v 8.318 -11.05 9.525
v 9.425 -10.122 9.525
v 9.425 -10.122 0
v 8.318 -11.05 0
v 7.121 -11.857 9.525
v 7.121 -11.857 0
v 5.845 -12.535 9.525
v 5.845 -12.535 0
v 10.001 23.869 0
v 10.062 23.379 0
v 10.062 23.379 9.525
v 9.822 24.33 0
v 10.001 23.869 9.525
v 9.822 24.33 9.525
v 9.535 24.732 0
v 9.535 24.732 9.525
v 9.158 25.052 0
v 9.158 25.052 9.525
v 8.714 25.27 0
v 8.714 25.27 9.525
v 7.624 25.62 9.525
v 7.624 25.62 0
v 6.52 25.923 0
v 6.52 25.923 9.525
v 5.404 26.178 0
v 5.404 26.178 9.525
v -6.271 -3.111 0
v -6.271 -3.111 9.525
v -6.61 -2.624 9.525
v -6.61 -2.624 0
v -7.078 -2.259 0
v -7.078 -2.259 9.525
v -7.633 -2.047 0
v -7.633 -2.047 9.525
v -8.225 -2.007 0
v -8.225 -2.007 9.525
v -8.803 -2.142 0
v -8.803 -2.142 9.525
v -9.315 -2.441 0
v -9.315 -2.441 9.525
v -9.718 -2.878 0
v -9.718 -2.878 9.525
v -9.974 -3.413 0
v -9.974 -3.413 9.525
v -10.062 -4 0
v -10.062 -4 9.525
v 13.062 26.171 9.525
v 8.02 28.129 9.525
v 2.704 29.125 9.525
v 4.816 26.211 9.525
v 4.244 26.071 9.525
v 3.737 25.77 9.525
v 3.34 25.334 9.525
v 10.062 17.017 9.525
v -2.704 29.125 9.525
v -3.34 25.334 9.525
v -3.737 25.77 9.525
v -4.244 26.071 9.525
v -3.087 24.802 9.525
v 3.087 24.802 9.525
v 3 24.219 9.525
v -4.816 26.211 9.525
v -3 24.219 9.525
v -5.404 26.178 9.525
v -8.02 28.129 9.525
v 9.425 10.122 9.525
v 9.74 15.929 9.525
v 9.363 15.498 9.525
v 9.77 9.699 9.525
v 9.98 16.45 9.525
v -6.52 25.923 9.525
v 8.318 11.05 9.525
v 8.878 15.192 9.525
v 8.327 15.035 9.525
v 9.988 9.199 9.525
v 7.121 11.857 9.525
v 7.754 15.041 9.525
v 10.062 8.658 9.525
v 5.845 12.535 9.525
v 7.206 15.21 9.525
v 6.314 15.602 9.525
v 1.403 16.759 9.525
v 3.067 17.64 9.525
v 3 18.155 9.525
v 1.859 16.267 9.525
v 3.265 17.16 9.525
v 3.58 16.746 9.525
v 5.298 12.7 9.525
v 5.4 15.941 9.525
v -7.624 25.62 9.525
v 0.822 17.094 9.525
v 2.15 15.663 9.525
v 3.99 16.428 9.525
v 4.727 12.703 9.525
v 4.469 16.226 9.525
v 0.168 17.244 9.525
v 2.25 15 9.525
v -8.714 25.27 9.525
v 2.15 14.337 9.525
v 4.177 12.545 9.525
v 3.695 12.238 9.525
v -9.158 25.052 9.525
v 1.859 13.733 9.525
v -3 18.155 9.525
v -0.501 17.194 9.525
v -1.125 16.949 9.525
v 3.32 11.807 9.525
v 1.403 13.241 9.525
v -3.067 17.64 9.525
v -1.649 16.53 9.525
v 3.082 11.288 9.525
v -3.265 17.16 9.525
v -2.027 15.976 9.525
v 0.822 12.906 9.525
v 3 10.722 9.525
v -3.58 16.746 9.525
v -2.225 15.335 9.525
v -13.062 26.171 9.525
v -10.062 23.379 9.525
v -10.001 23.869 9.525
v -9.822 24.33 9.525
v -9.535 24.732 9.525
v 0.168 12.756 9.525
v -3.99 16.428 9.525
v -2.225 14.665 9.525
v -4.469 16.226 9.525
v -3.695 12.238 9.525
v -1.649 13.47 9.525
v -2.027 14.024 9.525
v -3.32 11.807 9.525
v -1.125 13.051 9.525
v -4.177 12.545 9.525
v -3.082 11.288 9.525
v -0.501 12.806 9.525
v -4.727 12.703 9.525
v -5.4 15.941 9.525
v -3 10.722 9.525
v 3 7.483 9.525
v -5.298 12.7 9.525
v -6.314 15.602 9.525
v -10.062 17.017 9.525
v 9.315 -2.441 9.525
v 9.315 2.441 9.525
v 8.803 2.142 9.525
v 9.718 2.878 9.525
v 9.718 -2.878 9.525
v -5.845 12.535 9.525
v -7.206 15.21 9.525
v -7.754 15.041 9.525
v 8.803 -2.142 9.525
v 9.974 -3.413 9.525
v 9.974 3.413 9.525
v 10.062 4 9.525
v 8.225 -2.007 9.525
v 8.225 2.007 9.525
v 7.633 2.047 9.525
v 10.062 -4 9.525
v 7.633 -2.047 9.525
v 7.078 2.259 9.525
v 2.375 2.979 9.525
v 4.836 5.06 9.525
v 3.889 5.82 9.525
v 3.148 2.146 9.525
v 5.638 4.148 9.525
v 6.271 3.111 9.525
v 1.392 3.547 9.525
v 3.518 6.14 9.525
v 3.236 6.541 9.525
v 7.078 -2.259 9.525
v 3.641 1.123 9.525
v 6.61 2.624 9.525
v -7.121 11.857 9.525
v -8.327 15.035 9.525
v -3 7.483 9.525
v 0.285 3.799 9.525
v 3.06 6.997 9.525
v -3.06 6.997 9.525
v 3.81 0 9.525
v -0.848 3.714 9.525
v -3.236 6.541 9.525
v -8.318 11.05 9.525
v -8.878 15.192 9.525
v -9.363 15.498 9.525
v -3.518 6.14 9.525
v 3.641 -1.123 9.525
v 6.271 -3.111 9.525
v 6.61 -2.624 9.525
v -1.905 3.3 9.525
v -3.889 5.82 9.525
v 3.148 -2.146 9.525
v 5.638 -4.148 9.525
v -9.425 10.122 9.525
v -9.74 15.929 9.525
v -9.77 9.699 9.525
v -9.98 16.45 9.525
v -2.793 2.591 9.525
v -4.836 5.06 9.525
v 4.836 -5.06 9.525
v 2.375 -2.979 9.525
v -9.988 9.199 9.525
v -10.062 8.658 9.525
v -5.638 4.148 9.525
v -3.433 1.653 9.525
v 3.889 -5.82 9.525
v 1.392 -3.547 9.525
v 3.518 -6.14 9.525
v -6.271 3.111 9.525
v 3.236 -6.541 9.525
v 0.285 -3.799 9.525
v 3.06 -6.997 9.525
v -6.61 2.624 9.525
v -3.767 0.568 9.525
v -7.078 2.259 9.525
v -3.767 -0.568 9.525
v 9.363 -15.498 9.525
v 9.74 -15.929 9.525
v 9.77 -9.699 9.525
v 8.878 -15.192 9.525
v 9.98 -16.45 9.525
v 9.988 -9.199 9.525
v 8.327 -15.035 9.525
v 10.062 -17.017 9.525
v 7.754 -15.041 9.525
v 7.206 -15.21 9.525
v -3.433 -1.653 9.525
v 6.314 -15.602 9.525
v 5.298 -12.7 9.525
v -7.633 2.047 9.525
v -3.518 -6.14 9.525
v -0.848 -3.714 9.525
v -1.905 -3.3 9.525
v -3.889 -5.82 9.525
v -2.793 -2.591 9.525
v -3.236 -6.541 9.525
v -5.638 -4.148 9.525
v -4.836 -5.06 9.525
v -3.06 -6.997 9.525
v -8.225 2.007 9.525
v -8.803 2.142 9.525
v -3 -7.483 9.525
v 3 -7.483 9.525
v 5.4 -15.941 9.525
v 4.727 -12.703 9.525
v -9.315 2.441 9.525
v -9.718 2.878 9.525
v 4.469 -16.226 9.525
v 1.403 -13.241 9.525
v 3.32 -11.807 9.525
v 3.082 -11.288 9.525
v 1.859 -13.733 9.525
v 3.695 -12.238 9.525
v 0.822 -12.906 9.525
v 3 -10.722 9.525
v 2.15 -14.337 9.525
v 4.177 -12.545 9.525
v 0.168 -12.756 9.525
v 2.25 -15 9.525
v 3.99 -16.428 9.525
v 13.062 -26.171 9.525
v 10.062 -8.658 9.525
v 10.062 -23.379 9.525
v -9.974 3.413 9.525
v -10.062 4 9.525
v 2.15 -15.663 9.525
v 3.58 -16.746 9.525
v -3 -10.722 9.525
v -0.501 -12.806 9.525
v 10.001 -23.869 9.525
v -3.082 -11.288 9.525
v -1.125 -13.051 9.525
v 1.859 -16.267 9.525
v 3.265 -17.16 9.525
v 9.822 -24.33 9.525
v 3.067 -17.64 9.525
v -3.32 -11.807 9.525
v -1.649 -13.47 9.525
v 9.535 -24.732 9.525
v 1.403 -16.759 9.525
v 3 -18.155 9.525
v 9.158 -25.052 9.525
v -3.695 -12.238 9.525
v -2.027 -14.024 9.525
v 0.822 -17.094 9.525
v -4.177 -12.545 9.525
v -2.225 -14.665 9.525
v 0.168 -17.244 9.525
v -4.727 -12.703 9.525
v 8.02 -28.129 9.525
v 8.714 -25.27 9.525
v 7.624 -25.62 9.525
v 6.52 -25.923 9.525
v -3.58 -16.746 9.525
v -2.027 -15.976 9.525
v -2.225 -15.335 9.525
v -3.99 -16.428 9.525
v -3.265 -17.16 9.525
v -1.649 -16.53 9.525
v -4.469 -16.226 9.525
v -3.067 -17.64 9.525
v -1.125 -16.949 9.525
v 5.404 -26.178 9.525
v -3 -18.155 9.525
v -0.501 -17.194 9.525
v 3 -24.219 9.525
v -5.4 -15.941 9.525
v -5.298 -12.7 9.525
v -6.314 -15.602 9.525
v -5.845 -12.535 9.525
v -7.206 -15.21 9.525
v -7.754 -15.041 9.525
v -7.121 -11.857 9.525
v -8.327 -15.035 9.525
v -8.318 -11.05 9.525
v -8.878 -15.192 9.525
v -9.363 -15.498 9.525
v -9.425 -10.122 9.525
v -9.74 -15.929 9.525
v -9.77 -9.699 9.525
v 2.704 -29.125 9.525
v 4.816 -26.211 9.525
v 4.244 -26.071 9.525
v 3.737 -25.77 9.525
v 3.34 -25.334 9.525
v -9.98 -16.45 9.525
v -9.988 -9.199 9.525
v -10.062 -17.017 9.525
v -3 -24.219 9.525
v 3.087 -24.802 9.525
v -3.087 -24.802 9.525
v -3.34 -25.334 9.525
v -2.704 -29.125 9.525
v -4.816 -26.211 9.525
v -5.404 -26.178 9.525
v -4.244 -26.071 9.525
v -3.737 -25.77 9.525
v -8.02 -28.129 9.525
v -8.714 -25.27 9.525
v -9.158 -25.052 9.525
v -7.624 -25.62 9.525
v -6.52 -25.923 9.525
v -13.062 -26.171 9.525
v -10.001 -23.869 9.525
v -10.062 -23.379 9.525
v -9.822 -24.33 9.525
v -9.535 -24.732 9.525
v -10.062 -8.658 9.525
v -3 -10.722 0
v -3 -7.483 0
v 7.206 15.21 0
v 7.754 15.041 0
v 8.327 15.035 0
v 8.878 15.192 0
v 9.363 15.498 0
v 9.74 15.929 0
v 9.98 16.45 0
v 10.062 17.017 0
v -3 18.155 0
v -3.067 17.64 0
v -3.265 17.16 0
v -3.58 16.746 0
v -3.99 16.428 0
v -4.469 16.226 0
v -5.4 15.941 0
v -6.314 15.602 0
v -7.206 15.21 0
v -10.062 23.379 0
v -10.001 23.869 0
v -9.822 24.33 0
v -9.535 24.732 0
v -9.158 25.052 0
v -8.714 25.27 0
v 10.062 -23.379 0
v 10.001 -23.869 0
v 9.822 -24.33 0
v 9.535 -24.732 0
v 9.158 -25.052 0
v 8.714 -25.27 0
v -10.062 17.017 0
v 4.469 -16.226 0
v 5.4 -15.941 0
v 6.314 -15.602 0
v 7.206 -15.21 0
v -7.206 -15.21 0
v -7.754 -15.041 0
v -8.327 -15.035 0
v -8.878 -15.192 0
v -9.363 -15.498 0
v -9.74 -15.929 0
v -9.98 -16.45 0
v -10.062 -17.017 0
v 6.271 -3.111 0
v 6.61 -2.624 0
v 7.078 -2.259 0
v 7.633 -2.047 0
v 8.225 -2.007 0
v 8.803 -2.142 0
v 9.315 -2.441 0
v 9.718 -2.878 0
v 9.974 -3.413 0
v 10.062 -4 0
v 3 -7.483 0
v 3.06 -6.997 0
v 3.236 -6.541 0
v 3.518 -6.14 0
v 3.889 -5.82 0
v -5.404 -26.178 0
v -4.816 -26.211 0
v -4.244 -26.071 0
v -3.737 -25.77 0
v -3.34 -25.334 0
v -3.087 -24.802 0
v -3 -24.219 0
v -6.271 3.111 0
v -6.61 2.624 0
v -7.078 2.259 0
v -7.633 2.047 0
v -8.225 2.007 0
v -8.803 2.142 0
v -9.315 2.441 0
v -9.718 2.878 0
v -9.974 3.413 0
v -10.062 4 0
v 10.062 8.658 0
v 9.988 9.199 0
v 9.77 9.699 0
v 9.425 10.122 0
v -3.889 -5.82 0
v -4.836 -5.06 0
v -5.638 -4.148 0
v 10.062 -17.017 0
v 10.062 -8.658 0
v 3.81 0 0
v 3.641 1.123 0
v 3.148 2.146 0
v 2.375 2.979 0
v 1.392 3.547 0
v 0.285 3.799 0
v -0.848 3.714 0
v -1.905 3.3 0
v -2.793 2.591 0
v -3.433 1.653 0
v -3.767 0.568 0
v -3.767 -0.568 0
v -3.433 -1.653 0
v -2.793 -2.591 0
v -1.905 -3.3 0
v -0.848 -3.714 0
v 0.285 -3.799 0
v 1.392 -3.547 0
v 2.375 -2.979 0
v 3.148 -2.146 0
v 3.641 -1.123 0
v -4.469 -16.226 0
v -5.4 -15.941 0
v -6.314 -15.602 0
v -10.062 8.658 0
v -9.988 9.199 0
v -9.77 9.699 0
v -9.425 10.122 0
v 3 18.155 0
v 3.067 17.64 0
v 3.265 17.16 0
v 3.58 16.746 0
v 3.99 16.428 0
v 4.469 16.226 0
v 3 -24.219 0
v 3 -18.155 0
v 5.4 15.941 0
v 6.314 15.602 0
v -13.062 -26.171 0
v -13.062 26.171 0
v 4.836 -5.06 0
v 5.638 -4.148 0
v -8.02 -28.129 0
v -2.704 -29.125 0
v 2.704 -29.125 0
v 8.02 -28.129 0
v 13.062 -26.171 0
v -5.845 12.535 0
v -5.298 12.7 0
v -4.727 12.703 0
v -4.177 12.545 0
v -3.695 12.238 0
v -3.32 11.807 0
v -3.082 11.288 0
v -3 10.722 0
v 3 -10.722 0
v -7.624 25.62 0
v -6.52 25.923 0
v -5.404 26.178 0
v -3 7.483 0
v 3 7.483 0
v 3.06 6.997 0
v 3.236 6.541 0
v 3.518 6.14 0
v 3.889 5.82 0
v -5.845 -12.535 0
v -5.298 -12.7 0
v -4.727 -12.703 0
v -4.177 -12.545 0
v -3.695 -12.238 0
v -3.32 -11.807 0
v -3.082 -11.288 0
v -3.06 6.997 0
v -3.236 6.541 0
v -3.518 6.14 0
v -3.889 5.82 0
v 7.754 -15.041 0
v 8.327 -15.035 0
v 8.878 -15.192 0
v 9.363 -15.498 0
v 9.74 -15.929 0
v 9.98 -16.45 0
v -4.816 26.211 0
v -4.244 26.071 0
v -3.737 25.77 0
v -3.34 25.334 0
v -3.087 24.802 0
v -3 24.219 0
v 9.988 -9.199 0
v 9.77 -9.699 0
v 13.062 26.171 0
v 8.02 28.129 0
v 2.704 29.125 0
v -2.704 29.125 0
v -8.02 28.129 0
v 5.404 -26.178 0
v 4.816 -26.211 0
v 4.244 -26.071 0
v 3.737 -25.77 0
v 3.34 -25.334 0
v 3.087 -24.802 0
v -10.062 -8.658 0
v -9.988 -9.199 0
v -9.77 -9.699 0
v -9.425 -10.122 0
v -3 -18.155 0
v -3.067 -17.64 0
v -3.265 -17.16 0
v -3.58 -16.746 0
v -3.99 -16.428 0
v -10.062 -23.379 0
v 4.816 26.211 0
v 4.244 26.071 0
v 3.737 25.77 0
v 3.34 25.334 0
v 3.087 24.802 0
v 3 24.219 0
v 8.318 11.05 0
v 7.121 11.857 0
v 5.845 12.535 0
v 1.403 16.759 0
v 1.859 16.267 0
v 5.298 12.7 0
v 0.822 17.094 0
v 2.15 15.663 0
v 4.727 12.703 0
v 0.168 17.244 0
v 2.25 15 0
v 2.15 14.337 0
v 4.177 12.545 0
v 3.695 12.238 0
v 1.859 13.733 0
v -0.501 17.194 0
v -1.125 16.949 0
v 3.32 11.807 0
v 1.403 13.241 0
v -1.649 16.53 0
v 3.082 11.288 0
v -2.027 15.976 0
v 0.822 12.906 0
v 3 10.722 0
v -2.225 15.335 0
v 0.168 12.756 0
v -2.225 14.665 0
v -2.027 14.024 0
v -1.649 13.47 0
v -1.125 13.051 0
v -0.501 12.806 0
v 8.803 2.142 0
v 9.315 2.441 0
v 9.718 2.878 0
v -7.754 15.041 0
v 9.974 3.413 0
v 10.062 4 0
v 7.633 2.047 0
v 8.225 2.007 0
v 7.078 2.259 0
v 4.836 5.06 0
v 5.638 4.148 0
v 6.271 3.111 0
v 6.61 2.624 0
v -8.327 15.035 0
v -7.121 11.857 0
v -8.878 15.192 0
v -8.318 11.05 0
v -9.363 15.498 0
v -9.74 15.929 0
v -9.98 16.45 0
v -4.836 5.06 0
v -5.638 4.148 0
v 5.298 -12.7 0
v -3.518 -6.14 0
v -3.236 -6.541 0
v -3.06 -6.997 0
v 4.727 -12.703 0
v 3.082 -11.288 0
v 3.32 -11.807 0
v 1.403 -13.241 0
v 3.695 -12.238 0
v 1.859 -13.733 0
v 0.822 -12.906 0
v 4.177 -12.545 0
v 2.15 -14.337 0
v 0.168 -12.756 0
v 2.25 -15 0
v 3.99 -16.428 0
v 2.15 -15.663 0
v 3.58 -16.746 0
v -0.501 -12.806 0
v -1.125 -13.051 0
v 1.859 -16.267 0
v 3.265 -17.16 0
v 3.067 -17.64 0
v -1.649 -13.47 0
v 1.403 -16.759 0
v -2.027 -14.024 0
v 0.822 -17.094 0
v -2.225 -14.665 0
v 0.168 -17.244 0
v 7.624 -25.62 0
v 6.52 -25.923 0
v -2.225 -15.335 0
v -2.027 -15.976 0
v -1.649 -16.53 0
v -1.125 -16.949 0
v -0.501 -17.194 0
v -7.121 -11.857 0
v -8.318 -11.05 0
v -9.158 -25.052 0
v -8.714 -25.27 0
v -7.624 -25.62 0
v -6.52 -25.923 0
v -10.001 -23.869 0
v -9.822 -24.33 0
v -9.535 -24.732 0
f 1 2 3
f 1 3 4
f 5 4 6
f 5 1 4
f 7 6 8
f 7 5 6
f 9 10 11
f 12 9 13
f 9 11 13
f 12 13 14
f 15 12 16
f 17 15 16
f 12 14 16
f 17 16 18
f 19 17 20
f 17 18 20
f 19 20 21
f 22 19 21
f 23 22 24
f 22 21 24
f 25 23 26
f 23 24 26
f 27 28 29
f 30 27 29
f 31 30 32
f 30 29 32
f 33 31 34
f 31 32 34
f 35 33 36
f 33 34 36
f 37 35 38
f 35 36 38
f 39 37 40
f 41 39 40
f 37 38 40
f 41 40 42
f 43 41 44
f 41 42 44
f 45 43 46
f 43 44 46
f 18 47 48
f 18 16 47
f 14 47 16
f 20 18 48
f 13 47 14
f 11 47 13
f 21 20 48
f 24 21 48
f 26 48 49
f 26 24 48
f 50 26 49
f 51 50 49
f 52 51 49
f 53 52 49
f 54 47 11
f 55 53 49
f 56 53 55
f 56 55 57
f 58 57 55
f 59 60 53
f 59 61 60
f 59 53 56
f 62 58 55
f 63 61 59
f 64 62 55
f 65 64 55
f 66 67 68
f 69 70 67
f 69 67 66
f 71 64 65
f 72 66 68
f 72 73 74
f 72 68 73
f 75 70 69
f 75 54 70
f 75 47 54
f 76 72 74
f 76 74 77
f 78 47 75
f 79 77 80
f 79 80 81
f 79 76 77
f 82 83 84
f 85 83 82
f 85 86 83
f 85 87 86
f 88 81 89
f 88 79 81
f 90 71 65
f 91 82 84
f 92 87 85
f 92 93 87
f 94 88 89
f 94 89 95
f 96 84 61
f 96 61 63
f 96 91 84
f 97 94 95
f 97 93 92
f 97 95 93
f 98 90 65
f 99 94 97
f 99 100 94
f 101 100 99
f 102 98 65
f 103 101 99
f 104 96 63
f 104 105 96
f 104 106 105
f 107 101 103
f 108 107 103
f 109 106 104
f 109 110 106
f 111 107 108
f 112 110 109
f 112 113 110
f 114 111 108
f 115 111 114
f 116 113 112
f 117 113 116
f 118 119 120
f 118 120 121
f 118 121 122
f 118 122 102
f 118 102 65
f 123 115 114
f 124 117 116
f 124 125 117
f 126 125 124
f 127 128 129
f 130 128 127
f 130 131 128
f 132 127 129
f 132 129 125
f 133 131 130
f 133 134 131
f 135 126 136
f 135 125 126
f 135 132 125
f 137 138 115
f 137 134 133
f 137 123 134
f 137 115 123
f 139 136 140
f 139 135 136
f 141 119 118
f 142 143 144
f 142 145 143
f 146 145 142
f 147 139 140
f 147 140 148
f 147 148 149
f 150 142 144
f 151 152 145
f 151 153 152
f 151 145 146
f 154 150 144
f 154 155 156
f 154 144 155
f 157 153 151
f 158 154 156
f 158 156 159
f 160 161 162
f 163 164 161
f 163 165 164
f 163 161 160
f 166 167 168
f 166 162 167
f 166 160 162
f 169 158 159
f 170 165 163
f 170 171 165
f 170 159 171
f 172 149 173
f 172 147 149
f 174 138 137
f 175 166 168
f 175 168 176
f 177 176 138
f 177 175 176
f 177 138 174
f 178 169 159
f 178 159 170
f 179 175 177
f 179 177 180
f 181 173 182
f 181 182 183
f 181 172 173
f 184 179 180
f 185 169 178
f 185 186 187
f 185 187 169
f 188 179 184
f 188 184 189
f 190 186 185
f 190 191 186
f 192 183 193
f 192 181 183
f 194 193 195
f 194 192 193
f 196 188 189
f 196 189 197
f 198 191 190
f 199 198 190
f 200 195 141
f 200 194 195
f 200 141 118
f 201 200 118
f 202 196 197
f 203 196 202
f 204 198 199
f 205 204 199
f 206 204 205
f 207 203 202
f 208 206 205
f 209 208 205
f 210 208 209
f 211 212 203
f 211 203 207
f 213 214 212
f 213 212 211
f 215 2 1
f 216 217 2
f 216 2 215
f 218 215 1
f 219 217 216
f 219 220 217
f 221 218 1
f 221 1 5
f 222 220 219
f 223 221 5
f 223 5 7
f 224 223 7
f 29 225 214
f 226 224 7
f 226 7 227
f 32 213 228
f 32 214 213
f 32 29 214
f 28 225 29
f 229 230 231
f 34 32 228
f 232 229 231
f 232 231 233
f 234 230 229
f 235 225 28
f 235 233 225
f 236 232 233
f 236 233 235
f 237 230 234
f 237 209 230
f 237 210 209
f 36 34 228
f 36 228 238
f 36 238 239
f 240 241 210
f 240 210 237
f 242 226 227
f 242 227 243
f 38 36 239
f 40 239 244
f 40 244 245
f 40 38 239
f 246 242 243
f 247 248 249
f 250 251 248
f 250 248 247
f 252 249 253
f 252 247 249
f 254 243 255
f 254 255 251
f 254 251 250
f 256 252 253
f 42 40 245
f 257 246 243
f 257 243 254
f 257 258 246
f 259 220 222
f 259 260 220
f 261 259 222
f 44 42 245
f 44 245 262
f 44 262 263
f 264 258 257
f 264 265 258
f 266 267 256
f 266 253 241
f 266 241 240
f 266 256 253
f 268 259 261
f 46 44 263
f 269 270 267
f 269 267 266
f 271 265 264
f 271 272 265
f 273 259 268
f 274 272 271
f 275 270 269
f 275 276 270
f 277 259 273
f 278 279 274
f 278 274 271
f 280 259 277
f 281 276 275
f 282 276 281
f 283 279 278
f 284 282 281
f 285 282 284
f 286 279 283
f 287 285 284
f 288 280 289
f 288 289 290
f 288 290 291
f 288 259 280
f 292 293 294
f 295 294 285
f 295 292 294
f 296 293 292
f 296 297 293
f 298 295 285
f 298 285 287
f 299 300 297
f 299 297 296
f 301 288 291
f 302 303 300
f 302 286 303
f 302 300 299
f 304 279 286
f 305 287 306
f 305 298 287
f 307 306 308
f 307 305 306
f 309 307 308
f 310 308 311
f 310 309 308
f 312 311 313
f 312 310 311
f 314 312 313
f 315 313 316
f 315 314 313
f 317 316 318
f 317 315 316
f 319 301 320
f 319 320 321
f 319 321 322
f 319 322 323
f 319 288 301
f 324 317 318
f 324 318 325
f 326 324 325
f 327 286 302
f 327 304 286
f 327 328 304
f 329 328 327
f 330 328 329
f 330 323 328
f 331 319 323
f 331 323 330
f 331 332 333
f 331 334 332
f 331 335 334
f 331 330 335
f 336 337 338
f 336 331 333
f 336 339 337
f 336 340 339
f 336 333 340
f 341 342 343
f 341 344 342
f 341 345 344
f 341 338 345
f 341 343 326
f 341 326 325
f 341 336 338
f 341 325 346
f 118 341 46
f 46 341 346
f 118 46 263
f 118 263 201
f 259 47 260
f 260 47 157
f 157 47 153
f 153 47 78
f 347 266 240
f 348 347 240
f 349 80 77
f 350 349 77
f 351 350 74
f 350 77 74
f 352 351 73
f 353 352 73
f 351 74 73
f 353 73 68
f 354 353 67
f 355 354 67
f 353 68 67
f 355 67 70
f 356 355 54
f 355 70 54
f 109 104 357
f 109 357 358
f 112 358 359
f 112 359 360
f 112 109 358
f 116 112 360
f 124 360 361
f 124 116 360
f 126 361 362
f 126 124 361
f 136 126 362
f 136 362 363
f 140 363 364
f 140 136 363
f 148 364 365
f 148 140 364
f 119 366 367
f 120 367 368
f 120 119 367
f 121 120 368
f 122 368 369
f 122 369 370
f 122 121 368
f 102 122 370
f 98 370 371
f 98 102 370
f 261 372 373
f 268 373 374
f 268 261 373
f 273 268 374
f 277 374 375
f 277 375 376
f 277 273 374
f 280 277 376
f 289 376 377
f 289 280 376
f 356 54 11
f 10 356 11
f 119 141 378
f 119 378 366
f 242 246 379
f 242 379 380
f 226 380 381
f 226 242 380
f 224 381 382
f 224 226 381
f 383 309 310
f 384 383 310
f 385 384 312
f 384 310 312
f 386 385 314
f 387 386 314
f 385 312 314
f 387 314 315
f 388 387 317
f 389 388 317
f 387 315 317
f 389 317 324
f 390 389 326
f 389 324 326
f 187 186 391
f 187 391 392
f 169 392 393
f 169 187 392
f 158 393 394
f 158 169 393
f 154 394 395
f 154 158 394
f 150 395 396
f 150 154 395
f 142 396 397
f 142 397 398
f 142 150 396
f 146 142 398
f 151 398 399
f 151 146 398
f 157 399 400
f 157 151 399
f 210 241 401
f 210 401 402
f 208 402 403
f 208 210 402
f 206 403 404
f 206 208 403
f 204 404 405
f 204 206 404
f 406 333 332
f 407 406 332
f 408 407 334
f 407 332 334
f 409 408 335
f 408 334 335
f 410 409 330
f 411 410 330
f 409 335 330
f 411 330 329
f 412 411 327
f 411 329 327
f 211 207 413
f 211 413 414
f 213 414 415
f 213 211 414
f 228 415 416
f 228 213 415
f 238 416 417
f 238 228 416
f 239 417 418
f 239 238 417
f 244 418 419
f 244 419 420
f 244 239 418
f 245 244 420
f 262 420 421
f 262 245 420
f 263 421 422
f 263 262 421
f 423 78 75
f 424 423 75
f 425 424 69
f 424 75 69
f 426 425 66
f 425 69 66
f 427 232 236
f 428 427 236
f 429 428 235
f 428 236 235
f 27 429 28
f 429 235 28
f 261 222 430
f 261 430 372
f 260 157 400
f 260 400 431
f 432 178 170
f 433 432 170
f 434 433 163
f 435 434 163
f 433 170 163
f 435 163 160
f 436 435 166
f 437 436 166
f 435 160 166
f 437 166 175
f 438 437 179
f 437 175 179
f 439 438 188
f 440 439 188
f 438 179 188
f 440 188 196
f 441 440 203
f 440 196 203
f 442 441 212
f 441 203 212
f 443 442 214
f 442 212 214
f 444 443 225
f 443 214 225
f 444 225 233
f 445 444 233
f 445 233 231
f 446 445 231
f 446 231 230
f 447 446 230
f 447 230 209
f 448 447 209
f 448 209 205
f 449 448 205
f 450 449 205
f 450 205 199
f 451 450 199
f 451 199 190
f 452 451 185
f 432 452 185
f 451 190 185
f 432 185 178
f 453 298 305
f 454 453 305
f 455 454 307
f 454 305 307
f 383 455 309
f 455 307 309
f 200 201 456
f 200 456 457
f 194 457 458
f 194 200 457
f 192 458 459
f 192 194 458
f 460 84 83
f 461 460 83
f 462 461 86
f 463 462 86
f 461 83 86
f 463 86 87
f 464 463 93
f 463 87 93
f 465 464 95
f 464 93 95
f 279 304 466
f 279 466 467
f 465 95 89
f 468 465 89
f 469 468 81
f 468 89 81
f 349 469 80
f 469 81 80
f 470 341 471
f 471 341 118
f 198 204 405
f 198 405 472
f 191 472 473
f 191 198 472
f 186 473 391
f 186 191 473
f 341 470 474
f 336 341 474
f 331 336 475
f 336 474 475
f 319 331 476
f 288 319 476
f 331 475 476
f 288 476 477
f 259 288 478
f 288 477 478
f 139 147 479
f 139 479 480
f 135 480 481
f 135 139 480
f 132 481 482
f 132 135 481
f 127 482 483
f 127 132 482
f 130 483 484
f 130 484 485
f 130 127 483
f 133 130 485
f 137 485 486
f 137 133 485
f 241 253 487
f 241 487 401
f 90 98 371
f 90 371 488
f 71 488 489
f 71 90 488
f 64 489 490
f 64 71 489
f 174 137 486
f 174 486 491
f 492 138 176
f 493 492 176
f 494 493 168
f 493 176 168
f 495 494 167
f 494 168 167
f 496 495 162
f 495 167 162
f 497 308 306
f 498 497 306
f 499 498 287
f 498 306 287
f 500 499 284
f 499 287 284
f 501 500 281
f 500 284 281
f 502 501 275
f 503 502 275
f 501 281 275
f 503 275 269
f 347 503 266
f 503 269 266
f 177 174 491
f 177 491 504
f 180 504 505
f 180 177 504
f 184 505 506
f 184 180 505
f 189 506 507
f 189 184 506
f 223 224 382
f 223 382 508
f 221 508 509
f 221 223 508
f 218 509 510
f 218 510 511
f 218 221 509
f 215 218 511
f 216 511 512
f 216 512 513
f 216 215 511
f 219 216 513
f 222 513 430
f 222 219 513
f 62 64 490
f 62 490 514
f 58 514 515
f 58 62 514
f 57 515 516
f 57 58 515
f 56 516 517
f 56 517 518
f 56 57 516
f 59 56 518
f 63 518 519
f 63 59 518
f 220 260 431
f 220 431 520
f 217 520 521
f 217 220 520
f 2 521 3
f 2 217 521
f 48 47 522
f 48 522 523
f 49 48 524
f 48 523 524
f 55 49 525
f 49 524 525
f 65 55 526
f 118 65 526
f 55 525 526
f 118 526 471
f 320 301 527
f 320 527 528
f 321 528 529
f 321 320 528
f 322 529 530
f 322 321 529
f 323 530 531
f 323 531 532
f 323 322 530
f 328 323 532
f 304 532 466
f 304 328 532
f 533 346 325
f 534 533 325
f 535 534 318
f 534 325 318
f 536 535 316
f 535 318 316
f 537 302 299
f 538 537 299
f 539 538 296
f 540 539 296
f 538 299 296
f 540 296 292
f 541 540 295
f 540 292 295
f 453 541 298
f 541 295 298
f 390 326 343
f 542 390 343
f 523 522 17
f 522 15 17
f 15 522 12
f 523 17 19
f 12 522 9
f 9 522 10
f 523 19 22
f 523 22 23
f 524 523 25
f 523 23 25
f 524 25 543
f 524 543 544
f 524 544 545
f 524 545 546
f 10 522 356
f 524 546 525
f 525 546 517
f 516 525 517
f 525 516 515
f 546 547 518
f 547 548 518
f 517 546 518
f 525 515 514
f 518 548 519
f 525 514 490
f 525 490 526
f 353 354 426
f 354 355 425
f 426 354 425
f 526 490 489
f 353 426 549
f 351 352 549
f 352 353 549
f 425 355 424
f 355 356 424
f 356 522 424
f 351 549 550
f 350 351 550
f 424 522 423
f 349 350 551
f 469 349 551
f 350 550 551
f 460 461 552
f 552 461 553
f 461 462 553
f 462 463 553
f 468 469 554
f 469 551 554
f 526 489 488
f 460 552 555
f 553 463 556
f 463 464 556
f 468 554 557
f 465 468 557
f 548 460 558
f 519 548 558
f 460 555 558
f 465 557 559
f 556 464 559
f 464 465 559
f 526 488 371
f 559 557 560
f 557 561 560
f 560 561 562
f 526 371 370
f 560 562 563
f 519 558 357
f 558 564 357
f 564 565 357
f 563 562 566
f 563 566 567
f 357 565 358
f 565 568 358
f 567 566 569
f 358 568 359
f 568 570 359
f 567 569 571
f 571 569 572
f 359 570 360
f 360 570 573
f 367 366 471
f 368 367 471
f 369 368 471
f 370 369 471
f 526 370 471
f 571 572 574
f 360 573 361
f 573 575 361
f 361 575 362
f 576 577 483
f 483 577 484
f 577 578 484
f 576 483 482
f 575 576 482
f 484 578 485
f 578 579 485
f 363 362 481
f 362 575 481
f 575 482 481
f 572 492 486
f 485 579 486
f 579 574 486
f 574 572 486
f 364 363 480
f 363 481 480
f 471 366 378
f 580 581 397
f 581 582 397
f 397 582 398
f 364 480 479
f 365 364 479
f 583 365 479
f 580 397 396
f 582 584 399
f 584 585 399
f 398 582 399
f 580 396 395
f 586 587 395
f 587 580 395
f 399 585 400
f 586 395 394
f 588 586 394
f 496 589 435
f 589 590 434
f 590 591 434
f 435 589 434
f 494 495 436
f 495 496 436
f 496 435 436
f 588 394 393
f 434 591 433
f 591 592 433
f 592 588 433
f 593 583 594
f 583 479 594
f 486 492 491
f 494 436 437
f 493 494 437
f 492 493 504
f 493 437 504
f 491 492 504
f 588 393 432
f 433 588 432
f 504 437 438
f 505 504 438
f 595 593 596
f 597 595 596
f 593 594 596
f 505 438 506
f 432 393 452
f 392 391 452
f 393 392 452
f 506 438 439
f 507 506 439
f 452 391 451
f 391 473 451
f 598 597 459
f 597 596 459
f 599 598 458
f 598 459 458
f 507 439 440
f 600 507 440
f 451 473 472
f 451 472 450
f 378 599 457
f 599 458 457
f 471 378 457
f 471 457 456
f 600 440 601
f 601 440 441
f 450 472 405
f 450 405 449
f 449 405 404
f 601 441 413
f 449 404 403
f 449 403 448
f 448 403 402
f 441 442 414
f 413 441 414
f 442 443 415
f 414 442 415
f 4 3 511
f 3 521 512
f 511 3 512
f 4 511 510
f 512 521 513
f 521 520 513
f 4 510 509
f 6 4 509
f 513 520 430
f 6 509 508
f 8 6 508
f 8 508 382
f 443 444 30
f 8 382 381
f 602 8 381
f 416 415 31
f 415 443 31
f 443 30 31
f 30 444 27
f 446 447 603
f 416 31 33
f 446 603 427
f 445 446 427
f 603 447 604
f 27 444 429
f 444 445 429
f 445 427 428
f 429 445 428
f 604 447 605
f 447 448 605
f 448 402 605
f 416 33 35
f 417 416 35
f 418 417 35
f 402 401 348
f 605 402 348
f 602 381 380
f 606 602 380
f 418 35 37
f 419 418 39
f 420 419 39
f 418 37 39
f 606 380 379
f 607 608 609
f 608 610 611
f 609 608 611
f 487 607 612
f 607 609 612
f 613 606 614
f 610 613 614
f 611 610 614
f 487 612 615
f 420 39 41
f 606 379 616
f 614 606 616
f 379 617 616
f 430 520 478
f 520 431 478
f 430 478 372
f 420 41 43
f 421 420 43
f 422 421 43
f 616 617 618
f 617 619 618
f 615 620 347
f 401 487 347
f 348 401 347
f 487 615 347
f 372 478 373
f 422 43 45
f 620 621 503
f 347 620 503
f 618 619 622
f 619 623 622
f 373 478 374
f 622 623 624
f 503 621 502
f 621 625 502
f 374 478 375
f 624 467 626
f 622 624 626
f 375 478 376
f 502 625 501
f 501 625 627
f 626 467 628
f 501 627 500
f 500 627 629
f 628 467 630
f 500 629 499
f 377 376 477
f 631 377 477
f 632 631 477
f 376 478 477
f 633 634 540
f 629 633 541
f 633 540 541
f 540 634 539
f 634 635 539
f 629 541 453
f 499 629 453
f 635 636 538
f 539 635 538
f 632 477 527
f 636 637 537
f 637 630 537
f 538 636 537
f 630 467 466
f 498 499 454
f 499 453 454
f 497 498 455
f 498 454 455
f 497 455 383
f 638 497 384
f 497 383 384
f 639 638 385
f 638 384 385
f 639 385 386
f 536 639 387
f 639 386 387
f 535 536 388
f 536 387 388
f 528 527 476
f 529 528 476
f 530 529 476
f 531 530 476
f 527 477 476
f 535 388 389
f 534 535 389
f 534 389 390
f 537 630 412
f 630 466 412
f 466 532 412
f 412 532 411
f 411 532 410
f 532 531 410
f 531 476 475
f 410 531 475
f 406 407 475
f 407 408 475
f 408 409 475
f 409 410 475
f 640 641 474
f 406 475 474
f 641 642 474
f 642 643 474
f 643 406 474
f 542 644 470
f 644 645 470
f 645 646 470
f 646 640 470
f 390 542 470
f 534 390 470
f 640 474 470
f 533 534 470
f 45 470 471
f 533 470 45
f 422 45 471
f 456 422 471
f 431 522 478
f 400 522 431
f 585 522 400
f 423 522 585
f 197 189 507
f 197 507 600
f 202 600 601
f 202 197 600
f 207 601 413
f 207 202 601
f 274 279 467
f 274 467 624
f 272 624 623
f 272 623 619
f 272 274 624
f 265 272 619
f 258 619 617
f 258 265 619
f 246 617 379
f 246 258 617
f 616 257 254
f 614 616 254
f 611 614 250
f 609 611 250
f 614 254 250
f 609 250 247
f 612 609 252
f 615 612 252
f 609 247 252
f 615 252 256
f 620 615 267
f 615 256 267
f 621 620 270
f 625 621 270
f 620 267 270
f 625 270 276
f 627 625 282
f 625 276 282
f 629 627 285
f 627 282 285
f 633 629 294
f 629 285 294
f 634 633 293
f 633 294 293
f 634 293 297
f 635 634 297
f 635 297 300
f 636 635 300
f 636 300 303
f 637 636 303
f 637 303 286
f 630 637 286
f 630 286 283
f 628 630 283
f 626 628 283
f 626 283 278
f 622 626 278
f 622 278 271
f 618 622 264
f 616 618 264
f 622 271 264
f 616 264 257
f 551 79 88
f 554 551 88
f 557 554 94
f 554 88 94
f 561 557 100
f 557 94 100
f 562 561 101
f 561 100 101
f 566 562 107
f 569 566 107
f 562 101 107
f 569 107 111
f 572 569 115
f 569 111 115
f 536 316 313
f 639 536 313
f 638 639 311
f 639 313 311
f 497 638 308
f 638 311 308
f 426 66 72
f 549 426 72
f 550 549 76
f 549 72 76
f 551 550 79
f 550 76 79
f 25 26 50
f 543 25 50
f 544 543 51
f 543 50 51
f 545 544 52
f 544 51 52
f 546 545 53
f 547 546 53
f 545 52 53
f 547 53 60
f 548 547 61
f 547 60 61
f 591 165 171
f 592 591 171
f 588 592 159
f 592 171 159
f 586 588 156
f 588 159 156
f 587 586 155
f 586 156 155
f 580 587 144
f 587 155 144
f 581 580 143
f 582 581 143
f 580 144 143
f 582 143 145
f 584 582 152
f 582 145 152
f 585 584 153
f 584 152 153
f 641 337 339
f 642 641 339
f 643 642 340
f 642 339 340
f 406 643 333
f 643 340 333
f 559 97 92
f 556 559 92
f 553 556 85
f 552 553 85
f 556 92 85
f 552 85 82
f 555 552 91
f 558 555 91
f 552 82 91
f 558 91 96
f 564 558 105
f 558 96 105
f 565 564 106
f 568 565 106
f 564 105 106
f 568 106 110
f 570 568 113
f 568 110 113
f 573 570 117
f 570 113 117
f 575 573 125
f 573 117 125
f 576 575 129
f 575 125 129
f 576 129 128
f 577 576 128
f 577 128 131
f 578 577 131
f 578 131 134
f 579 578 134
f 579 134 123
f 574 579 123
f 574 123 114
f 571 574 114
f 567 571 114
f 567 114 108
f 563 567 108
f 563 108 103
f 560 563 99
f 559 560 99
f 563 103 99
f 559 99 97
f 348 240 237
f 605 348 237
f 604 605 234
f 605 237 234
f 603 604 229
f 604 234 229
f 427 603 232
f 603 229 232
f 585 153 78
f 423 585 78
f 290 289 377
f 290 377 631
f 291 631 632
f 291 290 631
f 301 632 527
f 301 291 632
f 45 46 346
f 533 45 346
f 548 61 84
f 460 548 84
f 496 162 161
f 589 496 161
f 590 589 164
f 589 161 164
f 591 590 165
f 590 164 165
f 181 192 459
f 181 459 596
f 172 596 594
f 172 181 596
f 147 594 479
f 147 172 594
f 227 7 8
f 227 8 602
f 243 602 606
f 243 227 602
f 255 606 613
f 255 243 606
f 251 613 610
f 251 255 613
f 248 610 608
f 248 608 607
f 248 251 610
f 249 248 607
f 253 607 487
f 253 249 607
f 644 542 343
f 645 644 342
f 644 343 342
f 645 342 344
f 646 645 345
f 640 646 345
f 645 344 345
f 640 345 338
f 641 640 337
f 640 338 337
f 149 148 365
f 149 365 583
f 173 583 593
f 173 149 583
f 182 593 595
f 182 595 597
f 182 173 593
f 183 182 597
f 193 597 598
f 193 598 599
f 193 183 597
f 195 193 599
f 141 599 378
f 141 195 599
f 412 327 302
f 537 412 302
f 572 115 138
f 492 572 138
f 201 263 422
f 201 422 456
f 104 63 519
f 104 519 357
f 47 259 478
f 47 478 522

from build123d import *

# Parameters (mm, degrees)
SKETCH1_R          = 29.25
EXTRUDE_3_8_DEPTH  = 9.525
CUT_EXTRUDE1_DEPTH = 9.525
SKETCH3_R          = 2.25
M4_THROUGH_DEPTH   = 9.525
SKETCH4_R          = 3.81
F_3_8_DRILL_DEPTH  = 9.525
SKETCH6_W          = 18.02935576
SKETCH6_H          = 57.579918791
CUT_EXTRUDE2_DEPTH = 9.525


with BuildPart() as part:
    # Sketch1 → 3/8 (new body)
    with BuildSketch(Plane.XY):
        with Locations(Location((0, 0, 0), (0, 0, 180))):
            Circle(SKETCH1_R)
    extrude(amount=EXTRUDE_3_8_DEPTH)

    # Sketch2 → Cut-Extrude1 (cut)
    with BuildSketch(Plane.XY.offset(9.525)):
        with BuildLine():
            Line((-3, 24.219267124), (-3, 18.154700472))
            ThreePointArc((-3, 18.154700472), (-3.409072822, 16.942697702), (-4.468950714, 16.226492325))
            ThreePointArc((-4.468950714, 16.226492325), (-5.859541661, 15.777716729), (-7.205966503, 15.210017108))
            ThreePointArc((-7.205966503, 15.210017108), (-9.131700947, 15.327380042), (-10.062257748, 17.017436623))
            Line((-10.062257748, 17.017436623), (-10.062257748, 23.378898605))
            ThreePointArc((-10.062257748, 23.378898605), (-9.690760884, 24.539922954), (-8.714280211, 25.269630397))
            ThreePointArc((-8.714280211, 25.269630397), (-7.073918129, 25.776977757), (-5.404367165, 26.177962402))
            ThreePointArc((-5.404367165, 26.177962402), (-3.736816389, 25.769869318), (-3, 24.219267124))
        make_face()
        with BuildLine():
            Line((-3, 10.72213294), (-3, 7.483314774))
            ThreePointArc((-3, 7.483314774), (-3.236165793, 6.540505732), (-3.888888889, 5.820355935))
            ThreePointArc((-3.888888889, 5.820355935), (-5.257283867, 4.621792546), (-6.270644915, 3.111111111))
            ThreePointArc((-6.270644915, 3.111111111), (-8.518752181, 2.052793582), (-10.062257748, 4))
            Line((-10.062257748, 4), (-10.062257748, 8.658183111))
            ThreePointArc((-10.062257748, 8.658183111), (-9.896091132, 9.45634044), (-9.425202627, 10.121870666))
            ThreePointArc((-9.425202627, 10.121870666), (-7.729958395, 11.468847089), (-5.845262531, 12.534736386))
            ThreePointArc((-5.845262531, 12.534736386), (-3.925412885, 12.408923541), (-3, 10.72213294))
        make_face()
        with BuildLine():
            Line((3, 10.72213294), (3, 7.483314774))
            ThreePointArc((3, 7.483314774), (3.236165793, 6.540505732), (3.888888889, 5.820355935))
            ThreePointArc((3.888888889, 5.820355935), (5.257283867, 4.621792546), (6.270644915, 3.111111111))
            ThreePointArc((6.270644915, 3.111111111), (8.518752181, 2.052793582), (10.062257748, 4))
            Line((10.062257748, 4), (10.062257748, 8.658183111))
            ThreePointArc((10.062257748, 8.658183111), (9.896091132, 9.45634044), (9.425202627, 10.121870666))
            ThreePointArc((9.425202627, 10.121870666), (7.729958395, 11.468847089), (5.845262531, 12.534736386))
            ThreePointArc((5.845262531, 12.534736386), (3.925412885, 12.408923541), (3, 10.72213294))
        make_face()
        with BuildLine():
            Line((3, 24.219267124), (3, 18.154700472))
            ThreePointArc((3, 18.154700472), (3.409072822, 16.942697702), (4.468950714, 16.226492325))
            ThreePointArc((4.468950714, 16.226492325), (5.859541661, 15.777716729), (7.205966503, 15.210017108))
            ThreePointArc((7.205966503, 15.210017108), (9.131700947, 15.327380042), (10.062257748, 17.017436623))
            Line((10.062257748, 17.017436623), (10.062257748, 23.378898605))
            ThreePointArc((10.062257748, 23.378898605), (9.690760884, 24.539922954), (8.714280211, 25.269630397))
            ThreePointArc((8.714280211, 25.269630397), (7.073918129, 25.776977757), (5.404367165, 26.177962402))
            ThreePointArc((5.404367165, 26.177962402), (3.736816389, 25.769869318), (3, 24.219267124))
        make_face()
        with BuildLine():
            Line((-3, -10.72213294), (-3, -7.483314774))
            ThreePointArc((-3, -7.483314774), (-3.236165793, -6.540505732), (-3.888888889, -5.820355935))
            ThreePointArc((-3.888888889, -5.820355935), (-5.257283867, -4.621792546), (-6.270644915, -3.111111111))
            ThreePointArc((-6.270644915, -3.111111111), (-8.518752181, -2.052793582), (-10.062257748, -4))
            Line((-10.062257748, -4), (-10.062257748, -8.658183111))
            ThreePointArc((-10.062257748, -8.658183111), (-9.896091132, -9.45634044), (-9.425202627, -10.121870666))
            ThreePointArc((-9.425202627, -10.121870666), (-7.729958395, -11.468847089), (-5.845262531, -12.534736386))
            ThreePointArc((-5.845262531, -12.534736386), (-3.925412885, -12.408923541), (-3, -10.72213294))
        make_face()
        with BuildLine():
            Line((3, -10.72213294), (3, -7.483314774))
            ThreePointArc((3, -7.483314774), (3.236165793, -6.540505732), (3.888888889, -5.820355935))
            ThreePointArc((3.888888889, -5.820355935), (5.257283867, -4.621792546), (6.270644915, -3.111111111))
            ThreePointArc((6.270644915, -3.111111111), (8.518752181, -2.052793582), (10.062257748, -4))
            Line((10.062257748, -4), (10.062257748, -8.658183111))
            ThreePointArc((10.062257748, -8.658183111), (9.896091132, -9.45634044), (9.425202627, -10.121870666))
            ThreePointArc((9.425202627, -10.121870666), (7.729958395, -11.468847089), (5.845262531, -12.534736386))
            ThreePointArc((5.845262531, -12.534736386), (3.925412885, -12.408923541), (3, -10.72213294))
        make_face()
        with BuildLine():
            Line((3, -24.219267124), (3, -18.154700472))
            ThreePointArc((3, -18.154700472), (3.409072822, -16.942697702), (4.468950714, -16.226492325))
            ThreePointArc((4.468950714, -16.226492325), (5.859541661, -15.777716729), (7.205966503, -15.210017108))
            ThreePointArc((7.205966503, -15.210017108), (9.131700947, -15.327380042), (10.062257748, -17.017436623))
            Line((10.062257748, -17.017436623), (10.062257748, -23.378898605))
            ThreePointArc((10.062257748, -23.378898605), (9.690760884, -24.539922954), (8.714280211, -25.269630397))
            ThreePointArc((8.714280211, -25.269630397), (7.073918129, -25.776977757), (5.404367165, -26.177962402))
            ThreePointArc((5.404367165, -26.177962402), (3.736816389, -25.769869318), (3, -24.219267124))
        make_face()
        with BuildLine():
            Line((-3, -24.219267124), (-3, -18.154700472))
            ThreePointArc((-3, -18.154700472), (-3.409072822, -16.942697702), (-4.468950714, -16.226492325))
            ThreePointArc((-4.468950714, -16.226492325), (-5.859541661, -15.777716729), (-7.205966503, -15.210017108))
            ThreePointArc((-7.205966503, -15.210017108), (-9.131700947, -15.327380042), (-10.062257748, -17.017436623))
            Line((-10.062257748, -17.017436623), (-10.062257748, -23.378898605))
            ThreePointArc((-10.062257748, -23.378898605), (-9.690760884, -24.539922954), (-8.714280211, -25.269630397))
            ThreePointArc((-8.714280211, -25.269630397), (-7.073918129, -25.776977757), (-5.404367165, -26.177962402))
            ThreePointArc((-5.404367165, -26.177962402), (-3.736816389, -25.769869318), (-3, -24.219267124))
        make_face()
    extrude(amount=-CUT_EXTRUDE1_DEPTH, mode=Mode.SUBTRACT)

    # Sketch3 → M4_through (cut)
    with BuildSketch(Plane.XY.offset(9.525)):
        with Locations((0, 15)):
            Circle(SKETCH3_R)
        with Locations((0, -15)):
            Circle(SKETCH3_R)
    extrude(amount=-M4_THROUGH_DEPTH, mode=Mode.SUBTRACT)

    # Sketch4 → 3/8_DRILL (cut)
    with BuildSketch(Plane.XY.offset(9.525)):
        Circle(SKETCH4_R)
    extrude(amount=-F_3_8_DRILL_DEPTH, mode=Mode.SUBTRACT)

    # Sketch6 → Cut-Extrude2 (cut)
    with BuildSketch(Plane.XY.offset(9.525)):
        with Locations((-22.076935628, -1.336167669)):
            Rectangle(SKETCH6_W, SKETCH6_H)
        with Locations((22.076935628, -1.336167669)):
            Rectangle(SKETCH6_W, SKETCH6_H)
    extrude(amount=-CUT_EXTRUDE2_DEPTH, mode=Mode.SUBTRACT)


solid = part.part
